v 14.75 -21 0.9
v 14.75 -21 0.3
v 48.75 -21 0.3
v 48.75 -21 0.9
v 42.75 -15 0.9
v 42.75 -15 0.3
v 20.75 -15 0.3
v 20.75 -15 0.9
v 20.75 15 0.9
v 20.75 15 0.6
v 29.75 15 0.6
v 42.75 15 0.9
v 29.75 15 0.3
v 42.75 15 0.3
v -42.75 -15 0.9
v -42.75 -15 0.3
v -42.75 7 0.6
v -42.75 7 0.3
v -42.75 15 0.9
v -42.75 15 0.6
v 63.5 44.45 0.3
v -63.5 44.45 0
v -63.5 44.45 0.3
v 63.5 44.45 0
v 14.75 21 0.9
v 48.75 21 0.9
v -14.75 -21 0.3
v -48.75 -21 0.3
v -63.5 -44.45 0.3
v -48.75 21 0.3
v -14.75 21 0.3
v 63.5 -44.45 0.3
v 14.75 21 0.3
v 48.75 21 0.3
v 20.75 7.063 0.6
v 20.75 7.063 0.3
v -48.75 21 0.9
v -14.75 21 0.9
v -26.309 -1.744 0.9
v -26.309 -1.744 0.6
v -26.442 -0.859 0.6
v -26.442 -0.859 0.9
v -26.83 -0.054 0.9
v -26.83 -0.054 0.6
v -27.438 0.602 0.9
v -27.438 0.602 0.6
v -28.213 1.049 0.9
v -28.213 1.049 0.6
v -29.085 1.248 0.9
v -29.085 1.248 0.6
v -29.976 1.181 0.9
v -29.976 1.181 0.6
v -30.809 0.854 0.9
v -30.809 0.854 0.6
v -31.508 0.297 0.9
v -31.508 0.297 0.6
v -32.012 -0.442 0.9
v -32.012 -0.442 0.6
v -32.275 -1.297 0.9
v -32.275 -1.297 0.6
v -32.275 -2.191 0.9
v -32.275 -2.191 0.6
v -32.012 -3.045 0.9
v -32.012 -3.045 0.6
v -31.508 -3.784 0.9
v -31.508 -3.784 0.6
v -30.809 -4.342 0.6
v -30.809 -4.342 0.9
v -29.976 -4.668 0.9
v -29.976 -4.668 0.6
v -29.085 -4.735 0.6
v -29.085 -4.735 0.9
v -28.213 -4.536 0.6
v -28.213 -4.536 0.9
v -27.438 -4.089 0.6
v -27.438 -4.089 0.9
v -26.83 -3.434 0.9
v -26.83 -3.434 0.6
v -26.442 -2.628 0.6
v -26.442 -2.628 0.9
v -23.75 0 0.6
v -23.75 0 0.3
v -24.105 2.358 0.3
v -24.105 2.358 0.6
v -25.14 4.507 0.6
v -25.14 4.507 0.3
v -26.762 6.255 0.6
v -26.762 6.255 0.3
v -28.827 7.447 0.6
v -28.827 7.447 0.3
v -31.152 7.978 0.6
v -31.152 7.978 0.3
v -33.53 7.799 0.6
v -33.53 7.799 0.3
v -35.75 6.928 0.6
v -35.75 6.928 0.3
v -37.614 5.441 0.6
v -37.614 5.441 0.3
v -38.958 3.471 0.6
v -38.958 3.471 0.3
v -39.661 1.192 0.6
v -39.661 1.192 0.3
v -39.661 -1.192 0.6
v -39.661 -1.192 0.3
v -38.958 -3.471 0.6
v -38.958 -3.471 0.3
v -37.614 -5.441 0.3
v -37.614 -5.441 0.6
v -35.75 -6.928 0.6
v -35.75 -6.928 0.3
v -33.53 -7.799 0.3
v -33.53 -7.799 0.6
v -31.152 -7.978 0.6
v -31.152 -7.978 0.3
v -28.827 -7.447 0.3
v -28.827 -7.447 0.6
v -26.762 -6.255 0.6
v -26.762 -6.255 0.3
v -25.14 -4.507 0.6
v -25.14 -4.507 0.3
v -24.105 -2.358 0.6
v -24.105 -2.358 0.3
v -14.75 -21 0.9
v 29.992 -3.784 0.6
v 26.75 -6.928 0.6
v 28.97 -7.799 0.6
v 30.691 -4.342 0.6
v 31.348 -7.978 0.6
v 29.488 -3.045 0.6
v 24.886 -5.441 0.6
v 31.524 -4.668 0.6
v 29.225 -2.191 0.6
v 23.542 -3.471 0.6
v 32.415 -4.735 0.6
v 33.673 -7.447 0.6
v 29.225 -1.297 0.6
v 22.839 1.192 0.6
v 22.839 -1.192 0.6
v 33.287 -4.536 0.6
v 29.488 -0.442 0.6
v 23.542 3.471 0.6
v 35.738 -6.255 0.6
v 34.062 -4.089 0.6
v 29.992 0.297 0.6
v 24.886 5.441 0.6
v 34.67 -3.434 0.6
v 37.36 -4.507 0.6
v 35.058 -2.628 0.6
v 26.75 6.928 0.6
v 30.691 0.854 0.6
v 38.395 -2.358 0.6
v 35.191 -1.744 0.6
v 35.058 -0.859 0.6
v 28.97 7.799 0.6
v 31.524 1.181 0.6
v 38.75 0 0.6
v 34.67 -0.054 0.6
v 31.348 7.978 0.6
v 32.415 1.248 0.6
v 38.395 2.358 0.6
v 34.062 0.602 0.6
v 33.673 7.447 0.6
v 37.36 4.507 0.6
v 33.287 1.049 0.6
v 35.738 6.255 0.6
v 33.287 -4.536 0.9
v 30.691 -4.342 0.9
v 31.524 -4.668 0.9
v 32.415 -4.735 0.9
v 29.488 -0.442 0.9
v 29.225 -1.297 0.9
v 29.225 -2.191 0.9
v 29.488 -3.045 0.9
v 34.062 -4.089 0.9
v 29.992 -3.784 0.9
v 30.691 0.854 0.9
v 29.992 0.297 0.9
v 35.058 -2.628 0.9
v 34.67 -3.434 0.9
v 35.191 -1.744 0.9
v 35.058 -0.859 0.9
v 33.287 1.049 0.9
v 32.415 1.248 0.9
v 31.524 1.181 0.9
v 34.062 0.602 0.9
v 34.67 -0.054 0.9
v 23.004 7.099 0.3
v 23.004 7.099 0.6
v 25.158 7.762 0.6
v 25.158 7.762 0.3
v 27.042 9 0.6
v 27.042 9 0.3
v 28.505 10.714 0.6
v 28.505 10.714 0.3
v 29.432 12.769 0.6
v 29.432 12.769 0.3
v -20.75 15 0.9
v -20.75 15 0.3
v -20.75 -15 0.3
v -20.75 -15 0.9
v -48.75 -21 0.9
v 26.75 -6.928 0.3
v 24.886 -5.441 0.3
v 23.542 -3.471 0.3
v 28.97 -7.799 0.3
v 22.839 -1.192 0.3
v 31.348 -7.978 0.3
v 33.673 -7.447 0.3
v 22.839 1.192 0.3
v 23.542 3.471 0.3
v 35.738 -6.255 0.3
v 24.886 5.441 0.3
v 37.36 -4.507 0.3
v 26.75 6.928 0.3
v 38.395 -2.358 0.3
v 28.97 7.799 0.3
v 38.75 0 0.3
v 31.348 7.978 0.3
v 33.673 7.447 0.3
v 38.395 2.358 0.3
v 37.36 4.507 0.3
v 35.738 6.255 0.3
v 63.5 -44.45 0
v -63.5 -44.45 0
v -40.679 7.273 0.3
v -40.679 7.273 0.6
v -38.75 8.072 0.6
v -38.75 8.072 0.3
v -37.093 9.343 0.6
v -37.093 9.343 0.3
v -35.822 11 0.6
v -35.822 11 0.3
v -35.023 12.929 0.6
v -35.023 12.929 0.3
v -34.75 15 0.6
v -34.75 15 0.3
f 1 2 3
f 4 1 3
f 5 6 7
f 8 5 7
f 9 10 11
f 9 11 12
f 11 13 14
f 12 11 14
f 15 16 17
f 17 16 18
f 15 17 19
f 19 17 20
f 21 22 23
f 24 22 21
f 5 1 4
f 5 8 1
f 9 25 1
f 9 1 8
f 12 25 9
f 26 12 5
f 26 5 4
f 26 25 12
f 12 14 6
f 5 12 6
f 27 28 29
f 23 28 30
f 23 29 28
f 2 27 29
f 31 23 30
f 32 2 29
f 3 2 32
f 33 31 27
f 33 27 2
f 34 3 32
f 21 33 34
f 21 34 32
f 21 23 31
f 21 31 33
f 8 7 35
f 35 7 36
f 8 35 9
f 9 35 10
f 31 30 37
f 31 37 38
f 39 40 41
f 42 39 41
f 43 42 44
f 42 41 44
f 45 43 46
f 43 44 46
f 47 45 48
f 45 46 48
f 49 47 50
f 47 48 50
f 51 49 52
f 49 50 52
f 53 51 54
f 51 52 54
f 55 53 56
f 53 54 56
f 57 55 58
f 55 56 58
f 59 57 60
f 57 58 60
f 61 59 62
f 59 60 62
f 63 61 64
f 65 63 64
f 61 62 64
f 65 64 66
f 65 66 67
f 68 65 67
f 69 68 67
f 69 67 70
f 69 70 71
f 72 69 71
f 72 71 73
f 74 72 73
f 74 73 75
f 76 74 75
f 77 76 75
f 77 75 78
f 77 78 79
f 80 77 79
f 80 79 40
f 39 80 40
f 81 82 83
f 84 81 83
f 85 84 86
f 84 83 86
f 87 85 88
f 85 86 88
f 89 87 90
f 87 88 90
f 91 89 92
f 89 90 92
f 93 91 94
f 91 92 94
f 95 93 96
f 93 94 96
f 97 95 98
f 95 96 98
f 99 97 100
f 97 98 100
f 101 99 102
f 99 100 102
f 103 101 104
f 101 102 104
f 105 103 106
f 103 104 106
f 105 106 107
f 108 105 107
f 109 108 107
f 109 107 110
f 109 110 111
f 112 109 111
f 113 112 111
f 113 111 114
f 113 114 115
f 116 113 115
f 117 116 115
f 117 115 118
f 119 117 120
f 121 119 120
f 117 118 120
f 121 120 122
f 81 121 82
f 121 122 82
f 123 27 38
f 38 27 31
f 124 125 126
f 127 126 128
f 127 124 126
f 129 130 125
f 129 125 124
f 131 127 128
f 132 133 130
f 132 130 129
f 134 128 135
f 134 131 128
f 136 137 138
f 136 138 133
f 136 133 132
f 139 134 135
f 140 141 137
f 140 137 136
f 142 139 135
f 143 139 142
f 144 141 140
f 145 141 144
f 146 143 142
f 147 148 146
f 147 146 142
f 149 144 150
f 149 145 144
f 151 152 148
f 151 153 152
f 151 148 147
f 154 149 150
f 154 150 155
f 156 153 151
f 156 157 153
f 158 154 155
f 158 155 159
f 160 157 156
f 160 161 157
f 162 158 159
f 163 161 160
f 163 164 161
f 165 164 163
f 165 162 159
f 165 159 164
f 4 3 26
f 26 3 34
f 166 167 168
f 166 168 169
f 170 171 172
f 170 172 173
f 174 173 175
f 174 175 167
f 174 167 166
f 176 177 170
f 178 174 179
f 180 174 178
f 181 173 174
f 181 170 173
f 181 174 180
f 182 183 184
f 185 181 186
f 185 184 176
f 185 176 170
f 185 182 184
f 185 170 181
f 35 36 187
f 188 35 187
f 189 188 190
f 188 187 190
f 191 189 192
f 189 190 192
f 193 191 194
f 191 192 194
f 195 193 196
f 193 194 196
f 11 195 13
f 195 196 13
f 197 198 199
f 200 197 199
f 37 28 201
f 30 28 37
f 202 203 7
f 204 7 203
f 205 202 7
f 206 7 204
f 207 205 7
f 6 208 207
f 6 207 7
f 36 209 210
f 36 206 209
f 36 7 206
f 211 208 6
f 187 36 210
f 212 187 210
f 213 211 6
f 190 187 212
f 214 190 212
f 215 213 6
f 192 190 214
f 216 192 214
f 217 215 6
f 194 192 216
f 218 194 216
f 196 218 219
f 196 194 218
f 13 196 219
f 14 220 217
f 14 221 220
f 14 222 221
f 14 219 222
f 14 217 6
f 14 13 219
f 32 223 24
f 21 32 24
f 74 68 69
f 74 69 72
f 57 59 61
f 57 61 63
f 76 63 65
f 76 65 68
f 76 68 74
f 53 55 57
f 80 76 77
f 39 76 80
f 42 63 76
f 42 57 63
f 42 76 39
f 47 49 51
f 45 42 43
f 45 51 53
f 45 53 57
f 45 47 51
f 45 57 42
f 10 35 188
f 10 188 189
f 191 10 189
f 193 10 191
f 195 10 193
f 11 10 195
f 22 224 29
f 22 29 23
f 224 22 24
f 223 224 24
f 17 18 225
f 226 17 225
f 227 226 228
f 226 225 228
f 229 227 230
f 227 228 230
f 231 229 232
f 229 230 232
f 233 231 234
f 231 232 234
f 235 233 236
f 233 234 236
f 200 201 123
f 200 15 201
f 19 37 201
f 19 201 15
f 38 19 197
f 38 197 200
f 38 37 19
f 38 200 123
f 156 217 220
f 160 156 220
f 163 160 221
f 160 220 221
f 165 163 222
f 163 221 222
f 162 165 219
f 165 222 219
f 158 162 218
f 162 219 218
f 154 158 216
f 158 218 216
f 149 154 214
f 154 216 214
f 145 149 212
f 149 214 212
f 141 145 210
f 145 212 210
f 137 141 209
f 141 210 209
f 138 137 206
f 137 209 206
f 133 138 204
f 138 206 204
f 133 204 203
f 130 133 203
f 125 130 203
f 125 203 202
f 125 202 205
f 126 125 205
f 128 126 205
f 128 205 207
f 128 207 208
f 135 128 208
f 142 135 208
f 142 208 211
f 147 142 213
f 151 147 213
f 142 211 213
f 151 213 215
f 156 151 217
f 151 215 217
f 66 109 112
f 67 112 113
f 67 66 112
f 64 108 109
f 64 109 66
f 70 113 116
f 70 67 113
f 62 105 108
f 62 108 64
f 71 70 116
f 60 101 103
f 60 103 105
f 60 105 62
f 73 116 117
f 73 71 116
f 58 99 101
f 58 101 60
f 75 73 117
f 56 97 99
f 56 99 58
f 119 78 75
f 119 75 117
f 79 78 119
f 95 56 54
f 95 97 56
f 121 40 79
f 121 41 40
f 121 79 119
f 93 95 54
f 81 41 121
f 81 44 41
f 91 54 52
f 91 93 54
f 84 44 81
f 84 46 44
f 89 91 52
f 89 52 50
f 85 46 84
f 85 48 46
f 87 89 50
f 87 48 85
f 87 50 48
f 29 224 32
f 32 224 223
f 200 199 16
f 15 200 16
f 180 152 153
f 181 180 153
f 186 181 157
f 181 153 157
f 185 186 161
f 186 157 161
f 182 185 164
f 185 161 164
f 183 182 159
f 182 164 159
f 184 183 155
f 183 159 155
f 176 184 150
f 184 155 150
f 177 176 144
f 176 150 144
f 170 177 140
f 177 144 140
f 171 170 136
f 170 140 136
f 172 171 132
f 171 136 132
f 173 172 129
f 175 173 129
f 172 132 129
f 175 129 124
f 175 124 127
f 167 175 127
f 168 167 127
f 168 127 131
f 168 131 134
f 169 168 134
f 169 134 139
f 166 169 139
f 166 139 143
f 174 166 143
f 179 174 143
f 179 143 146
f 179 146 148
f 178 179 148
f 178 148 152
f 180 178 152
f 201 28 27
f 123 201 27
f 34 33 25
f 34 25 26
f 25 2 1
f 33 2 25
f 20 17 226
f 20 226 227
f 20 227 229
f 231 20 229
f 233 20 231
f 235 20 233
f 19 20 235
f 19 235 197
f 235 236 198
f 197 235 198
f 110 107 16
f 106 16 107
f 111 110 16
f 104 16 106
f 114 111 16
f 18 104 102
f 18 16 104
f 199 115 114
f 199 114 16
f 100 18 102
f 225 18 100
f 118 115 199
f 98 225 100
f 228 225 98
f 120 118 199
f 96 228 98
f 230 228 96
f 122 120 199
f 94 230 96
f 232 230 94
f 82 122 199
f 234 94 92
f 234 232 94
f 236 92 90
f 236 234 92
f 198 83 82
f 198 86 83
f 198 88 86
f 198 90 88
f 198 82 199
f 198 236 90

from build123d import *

# Parameters (mm, degrees)
F0_W     = 127
F0_H     = 88.9
F1_DEPTH = 0.3
F2_R     = 8
F2_R_2   = 3
F3_DEPTH = 0.3
F2_W     = 33.9999994338
F2_H     = 41.9999994338
F4_DEPTH = 0.6


with BuildPart() as f1:
    # F0 (on Top) → F1 (new body)
    with BuildSketch(Plane.XY):
        Rectangle(F0_W, F0_H)
    extrude(amount=F1_DEPTH)

    # F2 (on face) → F3 (join)
    with BuildSketch(Plane.XY.offset(0.3)):
        with Locations((-31.75, 0)):
            Circle(F2_R)
        with Locations((-29.3087995864, -1.7437145812)):
            Circle(F2_R_2, mode=Mode.SUBTRACT)
        with Locations((30.75, 0)):
            Circle(F2_R)
        with Locations((32.1912004136, -1.7437145812)):
            Circle(F2_R_2, mode=Mode.SUBTRACT)
        with BuildLine():
            Line((-42.75, 15), (-42.75, 7))
            ThreePointArc((-42.75, 7), (-37.0931457505, 9.3431457505), (-34.75, 15))
            Line((-34.75, 15), (-42.75, 15))
        make_face()
        with BuildLine():
            ThreePointArc((20.75, 7.0627460668), (27.0415026221, 9), (29.75, 15))
            Line((29.75, 15), (20.75, 15))
            Line((20.75, 15), (20.75, 7.0627460668))
        make_face()
        with Locations((-29.3087995864, -1.7437145812)):
            Circle(F2_R_2)
        with Locations((32.1912004136, -1.7437145812)):
            Circle(F2_R_2)
    extrude(amount=F3_DEPTH)

    # F2 (on face) → F4 (join)
    with BuildSketch(Plane.XY.offset(0.3)):
        with Locations((-31.75, 0)):
            Rectangle(F2_W, F2_H)
        Polygon((-20.75, 15), (-20.75, -15), (-42.75, -15), (-42.75, 7), (-42.75, 15), (-34.75, 15), align=None, mode=Mode.SUBTRACT)
        with Locations((31.75, 0)):
            Rectangle(F2_W, F2_H)
        Polygon((29.75, 15), (42.75, 15), (42.75, -15), (20.75, -15), (20.75, 7.0627460668), (20.75, 15), align=None, mode=Mode.SUBTRACT)
        with Locations((-29.3087995864, -1.7437145812)):
            Circle(F2_R_2)
        with Locations((32.1912004136, -1.7437145812)):
            Circle(F2_R_2)
    extrude(amount=F4_DEPTH)


solid = f1.part
